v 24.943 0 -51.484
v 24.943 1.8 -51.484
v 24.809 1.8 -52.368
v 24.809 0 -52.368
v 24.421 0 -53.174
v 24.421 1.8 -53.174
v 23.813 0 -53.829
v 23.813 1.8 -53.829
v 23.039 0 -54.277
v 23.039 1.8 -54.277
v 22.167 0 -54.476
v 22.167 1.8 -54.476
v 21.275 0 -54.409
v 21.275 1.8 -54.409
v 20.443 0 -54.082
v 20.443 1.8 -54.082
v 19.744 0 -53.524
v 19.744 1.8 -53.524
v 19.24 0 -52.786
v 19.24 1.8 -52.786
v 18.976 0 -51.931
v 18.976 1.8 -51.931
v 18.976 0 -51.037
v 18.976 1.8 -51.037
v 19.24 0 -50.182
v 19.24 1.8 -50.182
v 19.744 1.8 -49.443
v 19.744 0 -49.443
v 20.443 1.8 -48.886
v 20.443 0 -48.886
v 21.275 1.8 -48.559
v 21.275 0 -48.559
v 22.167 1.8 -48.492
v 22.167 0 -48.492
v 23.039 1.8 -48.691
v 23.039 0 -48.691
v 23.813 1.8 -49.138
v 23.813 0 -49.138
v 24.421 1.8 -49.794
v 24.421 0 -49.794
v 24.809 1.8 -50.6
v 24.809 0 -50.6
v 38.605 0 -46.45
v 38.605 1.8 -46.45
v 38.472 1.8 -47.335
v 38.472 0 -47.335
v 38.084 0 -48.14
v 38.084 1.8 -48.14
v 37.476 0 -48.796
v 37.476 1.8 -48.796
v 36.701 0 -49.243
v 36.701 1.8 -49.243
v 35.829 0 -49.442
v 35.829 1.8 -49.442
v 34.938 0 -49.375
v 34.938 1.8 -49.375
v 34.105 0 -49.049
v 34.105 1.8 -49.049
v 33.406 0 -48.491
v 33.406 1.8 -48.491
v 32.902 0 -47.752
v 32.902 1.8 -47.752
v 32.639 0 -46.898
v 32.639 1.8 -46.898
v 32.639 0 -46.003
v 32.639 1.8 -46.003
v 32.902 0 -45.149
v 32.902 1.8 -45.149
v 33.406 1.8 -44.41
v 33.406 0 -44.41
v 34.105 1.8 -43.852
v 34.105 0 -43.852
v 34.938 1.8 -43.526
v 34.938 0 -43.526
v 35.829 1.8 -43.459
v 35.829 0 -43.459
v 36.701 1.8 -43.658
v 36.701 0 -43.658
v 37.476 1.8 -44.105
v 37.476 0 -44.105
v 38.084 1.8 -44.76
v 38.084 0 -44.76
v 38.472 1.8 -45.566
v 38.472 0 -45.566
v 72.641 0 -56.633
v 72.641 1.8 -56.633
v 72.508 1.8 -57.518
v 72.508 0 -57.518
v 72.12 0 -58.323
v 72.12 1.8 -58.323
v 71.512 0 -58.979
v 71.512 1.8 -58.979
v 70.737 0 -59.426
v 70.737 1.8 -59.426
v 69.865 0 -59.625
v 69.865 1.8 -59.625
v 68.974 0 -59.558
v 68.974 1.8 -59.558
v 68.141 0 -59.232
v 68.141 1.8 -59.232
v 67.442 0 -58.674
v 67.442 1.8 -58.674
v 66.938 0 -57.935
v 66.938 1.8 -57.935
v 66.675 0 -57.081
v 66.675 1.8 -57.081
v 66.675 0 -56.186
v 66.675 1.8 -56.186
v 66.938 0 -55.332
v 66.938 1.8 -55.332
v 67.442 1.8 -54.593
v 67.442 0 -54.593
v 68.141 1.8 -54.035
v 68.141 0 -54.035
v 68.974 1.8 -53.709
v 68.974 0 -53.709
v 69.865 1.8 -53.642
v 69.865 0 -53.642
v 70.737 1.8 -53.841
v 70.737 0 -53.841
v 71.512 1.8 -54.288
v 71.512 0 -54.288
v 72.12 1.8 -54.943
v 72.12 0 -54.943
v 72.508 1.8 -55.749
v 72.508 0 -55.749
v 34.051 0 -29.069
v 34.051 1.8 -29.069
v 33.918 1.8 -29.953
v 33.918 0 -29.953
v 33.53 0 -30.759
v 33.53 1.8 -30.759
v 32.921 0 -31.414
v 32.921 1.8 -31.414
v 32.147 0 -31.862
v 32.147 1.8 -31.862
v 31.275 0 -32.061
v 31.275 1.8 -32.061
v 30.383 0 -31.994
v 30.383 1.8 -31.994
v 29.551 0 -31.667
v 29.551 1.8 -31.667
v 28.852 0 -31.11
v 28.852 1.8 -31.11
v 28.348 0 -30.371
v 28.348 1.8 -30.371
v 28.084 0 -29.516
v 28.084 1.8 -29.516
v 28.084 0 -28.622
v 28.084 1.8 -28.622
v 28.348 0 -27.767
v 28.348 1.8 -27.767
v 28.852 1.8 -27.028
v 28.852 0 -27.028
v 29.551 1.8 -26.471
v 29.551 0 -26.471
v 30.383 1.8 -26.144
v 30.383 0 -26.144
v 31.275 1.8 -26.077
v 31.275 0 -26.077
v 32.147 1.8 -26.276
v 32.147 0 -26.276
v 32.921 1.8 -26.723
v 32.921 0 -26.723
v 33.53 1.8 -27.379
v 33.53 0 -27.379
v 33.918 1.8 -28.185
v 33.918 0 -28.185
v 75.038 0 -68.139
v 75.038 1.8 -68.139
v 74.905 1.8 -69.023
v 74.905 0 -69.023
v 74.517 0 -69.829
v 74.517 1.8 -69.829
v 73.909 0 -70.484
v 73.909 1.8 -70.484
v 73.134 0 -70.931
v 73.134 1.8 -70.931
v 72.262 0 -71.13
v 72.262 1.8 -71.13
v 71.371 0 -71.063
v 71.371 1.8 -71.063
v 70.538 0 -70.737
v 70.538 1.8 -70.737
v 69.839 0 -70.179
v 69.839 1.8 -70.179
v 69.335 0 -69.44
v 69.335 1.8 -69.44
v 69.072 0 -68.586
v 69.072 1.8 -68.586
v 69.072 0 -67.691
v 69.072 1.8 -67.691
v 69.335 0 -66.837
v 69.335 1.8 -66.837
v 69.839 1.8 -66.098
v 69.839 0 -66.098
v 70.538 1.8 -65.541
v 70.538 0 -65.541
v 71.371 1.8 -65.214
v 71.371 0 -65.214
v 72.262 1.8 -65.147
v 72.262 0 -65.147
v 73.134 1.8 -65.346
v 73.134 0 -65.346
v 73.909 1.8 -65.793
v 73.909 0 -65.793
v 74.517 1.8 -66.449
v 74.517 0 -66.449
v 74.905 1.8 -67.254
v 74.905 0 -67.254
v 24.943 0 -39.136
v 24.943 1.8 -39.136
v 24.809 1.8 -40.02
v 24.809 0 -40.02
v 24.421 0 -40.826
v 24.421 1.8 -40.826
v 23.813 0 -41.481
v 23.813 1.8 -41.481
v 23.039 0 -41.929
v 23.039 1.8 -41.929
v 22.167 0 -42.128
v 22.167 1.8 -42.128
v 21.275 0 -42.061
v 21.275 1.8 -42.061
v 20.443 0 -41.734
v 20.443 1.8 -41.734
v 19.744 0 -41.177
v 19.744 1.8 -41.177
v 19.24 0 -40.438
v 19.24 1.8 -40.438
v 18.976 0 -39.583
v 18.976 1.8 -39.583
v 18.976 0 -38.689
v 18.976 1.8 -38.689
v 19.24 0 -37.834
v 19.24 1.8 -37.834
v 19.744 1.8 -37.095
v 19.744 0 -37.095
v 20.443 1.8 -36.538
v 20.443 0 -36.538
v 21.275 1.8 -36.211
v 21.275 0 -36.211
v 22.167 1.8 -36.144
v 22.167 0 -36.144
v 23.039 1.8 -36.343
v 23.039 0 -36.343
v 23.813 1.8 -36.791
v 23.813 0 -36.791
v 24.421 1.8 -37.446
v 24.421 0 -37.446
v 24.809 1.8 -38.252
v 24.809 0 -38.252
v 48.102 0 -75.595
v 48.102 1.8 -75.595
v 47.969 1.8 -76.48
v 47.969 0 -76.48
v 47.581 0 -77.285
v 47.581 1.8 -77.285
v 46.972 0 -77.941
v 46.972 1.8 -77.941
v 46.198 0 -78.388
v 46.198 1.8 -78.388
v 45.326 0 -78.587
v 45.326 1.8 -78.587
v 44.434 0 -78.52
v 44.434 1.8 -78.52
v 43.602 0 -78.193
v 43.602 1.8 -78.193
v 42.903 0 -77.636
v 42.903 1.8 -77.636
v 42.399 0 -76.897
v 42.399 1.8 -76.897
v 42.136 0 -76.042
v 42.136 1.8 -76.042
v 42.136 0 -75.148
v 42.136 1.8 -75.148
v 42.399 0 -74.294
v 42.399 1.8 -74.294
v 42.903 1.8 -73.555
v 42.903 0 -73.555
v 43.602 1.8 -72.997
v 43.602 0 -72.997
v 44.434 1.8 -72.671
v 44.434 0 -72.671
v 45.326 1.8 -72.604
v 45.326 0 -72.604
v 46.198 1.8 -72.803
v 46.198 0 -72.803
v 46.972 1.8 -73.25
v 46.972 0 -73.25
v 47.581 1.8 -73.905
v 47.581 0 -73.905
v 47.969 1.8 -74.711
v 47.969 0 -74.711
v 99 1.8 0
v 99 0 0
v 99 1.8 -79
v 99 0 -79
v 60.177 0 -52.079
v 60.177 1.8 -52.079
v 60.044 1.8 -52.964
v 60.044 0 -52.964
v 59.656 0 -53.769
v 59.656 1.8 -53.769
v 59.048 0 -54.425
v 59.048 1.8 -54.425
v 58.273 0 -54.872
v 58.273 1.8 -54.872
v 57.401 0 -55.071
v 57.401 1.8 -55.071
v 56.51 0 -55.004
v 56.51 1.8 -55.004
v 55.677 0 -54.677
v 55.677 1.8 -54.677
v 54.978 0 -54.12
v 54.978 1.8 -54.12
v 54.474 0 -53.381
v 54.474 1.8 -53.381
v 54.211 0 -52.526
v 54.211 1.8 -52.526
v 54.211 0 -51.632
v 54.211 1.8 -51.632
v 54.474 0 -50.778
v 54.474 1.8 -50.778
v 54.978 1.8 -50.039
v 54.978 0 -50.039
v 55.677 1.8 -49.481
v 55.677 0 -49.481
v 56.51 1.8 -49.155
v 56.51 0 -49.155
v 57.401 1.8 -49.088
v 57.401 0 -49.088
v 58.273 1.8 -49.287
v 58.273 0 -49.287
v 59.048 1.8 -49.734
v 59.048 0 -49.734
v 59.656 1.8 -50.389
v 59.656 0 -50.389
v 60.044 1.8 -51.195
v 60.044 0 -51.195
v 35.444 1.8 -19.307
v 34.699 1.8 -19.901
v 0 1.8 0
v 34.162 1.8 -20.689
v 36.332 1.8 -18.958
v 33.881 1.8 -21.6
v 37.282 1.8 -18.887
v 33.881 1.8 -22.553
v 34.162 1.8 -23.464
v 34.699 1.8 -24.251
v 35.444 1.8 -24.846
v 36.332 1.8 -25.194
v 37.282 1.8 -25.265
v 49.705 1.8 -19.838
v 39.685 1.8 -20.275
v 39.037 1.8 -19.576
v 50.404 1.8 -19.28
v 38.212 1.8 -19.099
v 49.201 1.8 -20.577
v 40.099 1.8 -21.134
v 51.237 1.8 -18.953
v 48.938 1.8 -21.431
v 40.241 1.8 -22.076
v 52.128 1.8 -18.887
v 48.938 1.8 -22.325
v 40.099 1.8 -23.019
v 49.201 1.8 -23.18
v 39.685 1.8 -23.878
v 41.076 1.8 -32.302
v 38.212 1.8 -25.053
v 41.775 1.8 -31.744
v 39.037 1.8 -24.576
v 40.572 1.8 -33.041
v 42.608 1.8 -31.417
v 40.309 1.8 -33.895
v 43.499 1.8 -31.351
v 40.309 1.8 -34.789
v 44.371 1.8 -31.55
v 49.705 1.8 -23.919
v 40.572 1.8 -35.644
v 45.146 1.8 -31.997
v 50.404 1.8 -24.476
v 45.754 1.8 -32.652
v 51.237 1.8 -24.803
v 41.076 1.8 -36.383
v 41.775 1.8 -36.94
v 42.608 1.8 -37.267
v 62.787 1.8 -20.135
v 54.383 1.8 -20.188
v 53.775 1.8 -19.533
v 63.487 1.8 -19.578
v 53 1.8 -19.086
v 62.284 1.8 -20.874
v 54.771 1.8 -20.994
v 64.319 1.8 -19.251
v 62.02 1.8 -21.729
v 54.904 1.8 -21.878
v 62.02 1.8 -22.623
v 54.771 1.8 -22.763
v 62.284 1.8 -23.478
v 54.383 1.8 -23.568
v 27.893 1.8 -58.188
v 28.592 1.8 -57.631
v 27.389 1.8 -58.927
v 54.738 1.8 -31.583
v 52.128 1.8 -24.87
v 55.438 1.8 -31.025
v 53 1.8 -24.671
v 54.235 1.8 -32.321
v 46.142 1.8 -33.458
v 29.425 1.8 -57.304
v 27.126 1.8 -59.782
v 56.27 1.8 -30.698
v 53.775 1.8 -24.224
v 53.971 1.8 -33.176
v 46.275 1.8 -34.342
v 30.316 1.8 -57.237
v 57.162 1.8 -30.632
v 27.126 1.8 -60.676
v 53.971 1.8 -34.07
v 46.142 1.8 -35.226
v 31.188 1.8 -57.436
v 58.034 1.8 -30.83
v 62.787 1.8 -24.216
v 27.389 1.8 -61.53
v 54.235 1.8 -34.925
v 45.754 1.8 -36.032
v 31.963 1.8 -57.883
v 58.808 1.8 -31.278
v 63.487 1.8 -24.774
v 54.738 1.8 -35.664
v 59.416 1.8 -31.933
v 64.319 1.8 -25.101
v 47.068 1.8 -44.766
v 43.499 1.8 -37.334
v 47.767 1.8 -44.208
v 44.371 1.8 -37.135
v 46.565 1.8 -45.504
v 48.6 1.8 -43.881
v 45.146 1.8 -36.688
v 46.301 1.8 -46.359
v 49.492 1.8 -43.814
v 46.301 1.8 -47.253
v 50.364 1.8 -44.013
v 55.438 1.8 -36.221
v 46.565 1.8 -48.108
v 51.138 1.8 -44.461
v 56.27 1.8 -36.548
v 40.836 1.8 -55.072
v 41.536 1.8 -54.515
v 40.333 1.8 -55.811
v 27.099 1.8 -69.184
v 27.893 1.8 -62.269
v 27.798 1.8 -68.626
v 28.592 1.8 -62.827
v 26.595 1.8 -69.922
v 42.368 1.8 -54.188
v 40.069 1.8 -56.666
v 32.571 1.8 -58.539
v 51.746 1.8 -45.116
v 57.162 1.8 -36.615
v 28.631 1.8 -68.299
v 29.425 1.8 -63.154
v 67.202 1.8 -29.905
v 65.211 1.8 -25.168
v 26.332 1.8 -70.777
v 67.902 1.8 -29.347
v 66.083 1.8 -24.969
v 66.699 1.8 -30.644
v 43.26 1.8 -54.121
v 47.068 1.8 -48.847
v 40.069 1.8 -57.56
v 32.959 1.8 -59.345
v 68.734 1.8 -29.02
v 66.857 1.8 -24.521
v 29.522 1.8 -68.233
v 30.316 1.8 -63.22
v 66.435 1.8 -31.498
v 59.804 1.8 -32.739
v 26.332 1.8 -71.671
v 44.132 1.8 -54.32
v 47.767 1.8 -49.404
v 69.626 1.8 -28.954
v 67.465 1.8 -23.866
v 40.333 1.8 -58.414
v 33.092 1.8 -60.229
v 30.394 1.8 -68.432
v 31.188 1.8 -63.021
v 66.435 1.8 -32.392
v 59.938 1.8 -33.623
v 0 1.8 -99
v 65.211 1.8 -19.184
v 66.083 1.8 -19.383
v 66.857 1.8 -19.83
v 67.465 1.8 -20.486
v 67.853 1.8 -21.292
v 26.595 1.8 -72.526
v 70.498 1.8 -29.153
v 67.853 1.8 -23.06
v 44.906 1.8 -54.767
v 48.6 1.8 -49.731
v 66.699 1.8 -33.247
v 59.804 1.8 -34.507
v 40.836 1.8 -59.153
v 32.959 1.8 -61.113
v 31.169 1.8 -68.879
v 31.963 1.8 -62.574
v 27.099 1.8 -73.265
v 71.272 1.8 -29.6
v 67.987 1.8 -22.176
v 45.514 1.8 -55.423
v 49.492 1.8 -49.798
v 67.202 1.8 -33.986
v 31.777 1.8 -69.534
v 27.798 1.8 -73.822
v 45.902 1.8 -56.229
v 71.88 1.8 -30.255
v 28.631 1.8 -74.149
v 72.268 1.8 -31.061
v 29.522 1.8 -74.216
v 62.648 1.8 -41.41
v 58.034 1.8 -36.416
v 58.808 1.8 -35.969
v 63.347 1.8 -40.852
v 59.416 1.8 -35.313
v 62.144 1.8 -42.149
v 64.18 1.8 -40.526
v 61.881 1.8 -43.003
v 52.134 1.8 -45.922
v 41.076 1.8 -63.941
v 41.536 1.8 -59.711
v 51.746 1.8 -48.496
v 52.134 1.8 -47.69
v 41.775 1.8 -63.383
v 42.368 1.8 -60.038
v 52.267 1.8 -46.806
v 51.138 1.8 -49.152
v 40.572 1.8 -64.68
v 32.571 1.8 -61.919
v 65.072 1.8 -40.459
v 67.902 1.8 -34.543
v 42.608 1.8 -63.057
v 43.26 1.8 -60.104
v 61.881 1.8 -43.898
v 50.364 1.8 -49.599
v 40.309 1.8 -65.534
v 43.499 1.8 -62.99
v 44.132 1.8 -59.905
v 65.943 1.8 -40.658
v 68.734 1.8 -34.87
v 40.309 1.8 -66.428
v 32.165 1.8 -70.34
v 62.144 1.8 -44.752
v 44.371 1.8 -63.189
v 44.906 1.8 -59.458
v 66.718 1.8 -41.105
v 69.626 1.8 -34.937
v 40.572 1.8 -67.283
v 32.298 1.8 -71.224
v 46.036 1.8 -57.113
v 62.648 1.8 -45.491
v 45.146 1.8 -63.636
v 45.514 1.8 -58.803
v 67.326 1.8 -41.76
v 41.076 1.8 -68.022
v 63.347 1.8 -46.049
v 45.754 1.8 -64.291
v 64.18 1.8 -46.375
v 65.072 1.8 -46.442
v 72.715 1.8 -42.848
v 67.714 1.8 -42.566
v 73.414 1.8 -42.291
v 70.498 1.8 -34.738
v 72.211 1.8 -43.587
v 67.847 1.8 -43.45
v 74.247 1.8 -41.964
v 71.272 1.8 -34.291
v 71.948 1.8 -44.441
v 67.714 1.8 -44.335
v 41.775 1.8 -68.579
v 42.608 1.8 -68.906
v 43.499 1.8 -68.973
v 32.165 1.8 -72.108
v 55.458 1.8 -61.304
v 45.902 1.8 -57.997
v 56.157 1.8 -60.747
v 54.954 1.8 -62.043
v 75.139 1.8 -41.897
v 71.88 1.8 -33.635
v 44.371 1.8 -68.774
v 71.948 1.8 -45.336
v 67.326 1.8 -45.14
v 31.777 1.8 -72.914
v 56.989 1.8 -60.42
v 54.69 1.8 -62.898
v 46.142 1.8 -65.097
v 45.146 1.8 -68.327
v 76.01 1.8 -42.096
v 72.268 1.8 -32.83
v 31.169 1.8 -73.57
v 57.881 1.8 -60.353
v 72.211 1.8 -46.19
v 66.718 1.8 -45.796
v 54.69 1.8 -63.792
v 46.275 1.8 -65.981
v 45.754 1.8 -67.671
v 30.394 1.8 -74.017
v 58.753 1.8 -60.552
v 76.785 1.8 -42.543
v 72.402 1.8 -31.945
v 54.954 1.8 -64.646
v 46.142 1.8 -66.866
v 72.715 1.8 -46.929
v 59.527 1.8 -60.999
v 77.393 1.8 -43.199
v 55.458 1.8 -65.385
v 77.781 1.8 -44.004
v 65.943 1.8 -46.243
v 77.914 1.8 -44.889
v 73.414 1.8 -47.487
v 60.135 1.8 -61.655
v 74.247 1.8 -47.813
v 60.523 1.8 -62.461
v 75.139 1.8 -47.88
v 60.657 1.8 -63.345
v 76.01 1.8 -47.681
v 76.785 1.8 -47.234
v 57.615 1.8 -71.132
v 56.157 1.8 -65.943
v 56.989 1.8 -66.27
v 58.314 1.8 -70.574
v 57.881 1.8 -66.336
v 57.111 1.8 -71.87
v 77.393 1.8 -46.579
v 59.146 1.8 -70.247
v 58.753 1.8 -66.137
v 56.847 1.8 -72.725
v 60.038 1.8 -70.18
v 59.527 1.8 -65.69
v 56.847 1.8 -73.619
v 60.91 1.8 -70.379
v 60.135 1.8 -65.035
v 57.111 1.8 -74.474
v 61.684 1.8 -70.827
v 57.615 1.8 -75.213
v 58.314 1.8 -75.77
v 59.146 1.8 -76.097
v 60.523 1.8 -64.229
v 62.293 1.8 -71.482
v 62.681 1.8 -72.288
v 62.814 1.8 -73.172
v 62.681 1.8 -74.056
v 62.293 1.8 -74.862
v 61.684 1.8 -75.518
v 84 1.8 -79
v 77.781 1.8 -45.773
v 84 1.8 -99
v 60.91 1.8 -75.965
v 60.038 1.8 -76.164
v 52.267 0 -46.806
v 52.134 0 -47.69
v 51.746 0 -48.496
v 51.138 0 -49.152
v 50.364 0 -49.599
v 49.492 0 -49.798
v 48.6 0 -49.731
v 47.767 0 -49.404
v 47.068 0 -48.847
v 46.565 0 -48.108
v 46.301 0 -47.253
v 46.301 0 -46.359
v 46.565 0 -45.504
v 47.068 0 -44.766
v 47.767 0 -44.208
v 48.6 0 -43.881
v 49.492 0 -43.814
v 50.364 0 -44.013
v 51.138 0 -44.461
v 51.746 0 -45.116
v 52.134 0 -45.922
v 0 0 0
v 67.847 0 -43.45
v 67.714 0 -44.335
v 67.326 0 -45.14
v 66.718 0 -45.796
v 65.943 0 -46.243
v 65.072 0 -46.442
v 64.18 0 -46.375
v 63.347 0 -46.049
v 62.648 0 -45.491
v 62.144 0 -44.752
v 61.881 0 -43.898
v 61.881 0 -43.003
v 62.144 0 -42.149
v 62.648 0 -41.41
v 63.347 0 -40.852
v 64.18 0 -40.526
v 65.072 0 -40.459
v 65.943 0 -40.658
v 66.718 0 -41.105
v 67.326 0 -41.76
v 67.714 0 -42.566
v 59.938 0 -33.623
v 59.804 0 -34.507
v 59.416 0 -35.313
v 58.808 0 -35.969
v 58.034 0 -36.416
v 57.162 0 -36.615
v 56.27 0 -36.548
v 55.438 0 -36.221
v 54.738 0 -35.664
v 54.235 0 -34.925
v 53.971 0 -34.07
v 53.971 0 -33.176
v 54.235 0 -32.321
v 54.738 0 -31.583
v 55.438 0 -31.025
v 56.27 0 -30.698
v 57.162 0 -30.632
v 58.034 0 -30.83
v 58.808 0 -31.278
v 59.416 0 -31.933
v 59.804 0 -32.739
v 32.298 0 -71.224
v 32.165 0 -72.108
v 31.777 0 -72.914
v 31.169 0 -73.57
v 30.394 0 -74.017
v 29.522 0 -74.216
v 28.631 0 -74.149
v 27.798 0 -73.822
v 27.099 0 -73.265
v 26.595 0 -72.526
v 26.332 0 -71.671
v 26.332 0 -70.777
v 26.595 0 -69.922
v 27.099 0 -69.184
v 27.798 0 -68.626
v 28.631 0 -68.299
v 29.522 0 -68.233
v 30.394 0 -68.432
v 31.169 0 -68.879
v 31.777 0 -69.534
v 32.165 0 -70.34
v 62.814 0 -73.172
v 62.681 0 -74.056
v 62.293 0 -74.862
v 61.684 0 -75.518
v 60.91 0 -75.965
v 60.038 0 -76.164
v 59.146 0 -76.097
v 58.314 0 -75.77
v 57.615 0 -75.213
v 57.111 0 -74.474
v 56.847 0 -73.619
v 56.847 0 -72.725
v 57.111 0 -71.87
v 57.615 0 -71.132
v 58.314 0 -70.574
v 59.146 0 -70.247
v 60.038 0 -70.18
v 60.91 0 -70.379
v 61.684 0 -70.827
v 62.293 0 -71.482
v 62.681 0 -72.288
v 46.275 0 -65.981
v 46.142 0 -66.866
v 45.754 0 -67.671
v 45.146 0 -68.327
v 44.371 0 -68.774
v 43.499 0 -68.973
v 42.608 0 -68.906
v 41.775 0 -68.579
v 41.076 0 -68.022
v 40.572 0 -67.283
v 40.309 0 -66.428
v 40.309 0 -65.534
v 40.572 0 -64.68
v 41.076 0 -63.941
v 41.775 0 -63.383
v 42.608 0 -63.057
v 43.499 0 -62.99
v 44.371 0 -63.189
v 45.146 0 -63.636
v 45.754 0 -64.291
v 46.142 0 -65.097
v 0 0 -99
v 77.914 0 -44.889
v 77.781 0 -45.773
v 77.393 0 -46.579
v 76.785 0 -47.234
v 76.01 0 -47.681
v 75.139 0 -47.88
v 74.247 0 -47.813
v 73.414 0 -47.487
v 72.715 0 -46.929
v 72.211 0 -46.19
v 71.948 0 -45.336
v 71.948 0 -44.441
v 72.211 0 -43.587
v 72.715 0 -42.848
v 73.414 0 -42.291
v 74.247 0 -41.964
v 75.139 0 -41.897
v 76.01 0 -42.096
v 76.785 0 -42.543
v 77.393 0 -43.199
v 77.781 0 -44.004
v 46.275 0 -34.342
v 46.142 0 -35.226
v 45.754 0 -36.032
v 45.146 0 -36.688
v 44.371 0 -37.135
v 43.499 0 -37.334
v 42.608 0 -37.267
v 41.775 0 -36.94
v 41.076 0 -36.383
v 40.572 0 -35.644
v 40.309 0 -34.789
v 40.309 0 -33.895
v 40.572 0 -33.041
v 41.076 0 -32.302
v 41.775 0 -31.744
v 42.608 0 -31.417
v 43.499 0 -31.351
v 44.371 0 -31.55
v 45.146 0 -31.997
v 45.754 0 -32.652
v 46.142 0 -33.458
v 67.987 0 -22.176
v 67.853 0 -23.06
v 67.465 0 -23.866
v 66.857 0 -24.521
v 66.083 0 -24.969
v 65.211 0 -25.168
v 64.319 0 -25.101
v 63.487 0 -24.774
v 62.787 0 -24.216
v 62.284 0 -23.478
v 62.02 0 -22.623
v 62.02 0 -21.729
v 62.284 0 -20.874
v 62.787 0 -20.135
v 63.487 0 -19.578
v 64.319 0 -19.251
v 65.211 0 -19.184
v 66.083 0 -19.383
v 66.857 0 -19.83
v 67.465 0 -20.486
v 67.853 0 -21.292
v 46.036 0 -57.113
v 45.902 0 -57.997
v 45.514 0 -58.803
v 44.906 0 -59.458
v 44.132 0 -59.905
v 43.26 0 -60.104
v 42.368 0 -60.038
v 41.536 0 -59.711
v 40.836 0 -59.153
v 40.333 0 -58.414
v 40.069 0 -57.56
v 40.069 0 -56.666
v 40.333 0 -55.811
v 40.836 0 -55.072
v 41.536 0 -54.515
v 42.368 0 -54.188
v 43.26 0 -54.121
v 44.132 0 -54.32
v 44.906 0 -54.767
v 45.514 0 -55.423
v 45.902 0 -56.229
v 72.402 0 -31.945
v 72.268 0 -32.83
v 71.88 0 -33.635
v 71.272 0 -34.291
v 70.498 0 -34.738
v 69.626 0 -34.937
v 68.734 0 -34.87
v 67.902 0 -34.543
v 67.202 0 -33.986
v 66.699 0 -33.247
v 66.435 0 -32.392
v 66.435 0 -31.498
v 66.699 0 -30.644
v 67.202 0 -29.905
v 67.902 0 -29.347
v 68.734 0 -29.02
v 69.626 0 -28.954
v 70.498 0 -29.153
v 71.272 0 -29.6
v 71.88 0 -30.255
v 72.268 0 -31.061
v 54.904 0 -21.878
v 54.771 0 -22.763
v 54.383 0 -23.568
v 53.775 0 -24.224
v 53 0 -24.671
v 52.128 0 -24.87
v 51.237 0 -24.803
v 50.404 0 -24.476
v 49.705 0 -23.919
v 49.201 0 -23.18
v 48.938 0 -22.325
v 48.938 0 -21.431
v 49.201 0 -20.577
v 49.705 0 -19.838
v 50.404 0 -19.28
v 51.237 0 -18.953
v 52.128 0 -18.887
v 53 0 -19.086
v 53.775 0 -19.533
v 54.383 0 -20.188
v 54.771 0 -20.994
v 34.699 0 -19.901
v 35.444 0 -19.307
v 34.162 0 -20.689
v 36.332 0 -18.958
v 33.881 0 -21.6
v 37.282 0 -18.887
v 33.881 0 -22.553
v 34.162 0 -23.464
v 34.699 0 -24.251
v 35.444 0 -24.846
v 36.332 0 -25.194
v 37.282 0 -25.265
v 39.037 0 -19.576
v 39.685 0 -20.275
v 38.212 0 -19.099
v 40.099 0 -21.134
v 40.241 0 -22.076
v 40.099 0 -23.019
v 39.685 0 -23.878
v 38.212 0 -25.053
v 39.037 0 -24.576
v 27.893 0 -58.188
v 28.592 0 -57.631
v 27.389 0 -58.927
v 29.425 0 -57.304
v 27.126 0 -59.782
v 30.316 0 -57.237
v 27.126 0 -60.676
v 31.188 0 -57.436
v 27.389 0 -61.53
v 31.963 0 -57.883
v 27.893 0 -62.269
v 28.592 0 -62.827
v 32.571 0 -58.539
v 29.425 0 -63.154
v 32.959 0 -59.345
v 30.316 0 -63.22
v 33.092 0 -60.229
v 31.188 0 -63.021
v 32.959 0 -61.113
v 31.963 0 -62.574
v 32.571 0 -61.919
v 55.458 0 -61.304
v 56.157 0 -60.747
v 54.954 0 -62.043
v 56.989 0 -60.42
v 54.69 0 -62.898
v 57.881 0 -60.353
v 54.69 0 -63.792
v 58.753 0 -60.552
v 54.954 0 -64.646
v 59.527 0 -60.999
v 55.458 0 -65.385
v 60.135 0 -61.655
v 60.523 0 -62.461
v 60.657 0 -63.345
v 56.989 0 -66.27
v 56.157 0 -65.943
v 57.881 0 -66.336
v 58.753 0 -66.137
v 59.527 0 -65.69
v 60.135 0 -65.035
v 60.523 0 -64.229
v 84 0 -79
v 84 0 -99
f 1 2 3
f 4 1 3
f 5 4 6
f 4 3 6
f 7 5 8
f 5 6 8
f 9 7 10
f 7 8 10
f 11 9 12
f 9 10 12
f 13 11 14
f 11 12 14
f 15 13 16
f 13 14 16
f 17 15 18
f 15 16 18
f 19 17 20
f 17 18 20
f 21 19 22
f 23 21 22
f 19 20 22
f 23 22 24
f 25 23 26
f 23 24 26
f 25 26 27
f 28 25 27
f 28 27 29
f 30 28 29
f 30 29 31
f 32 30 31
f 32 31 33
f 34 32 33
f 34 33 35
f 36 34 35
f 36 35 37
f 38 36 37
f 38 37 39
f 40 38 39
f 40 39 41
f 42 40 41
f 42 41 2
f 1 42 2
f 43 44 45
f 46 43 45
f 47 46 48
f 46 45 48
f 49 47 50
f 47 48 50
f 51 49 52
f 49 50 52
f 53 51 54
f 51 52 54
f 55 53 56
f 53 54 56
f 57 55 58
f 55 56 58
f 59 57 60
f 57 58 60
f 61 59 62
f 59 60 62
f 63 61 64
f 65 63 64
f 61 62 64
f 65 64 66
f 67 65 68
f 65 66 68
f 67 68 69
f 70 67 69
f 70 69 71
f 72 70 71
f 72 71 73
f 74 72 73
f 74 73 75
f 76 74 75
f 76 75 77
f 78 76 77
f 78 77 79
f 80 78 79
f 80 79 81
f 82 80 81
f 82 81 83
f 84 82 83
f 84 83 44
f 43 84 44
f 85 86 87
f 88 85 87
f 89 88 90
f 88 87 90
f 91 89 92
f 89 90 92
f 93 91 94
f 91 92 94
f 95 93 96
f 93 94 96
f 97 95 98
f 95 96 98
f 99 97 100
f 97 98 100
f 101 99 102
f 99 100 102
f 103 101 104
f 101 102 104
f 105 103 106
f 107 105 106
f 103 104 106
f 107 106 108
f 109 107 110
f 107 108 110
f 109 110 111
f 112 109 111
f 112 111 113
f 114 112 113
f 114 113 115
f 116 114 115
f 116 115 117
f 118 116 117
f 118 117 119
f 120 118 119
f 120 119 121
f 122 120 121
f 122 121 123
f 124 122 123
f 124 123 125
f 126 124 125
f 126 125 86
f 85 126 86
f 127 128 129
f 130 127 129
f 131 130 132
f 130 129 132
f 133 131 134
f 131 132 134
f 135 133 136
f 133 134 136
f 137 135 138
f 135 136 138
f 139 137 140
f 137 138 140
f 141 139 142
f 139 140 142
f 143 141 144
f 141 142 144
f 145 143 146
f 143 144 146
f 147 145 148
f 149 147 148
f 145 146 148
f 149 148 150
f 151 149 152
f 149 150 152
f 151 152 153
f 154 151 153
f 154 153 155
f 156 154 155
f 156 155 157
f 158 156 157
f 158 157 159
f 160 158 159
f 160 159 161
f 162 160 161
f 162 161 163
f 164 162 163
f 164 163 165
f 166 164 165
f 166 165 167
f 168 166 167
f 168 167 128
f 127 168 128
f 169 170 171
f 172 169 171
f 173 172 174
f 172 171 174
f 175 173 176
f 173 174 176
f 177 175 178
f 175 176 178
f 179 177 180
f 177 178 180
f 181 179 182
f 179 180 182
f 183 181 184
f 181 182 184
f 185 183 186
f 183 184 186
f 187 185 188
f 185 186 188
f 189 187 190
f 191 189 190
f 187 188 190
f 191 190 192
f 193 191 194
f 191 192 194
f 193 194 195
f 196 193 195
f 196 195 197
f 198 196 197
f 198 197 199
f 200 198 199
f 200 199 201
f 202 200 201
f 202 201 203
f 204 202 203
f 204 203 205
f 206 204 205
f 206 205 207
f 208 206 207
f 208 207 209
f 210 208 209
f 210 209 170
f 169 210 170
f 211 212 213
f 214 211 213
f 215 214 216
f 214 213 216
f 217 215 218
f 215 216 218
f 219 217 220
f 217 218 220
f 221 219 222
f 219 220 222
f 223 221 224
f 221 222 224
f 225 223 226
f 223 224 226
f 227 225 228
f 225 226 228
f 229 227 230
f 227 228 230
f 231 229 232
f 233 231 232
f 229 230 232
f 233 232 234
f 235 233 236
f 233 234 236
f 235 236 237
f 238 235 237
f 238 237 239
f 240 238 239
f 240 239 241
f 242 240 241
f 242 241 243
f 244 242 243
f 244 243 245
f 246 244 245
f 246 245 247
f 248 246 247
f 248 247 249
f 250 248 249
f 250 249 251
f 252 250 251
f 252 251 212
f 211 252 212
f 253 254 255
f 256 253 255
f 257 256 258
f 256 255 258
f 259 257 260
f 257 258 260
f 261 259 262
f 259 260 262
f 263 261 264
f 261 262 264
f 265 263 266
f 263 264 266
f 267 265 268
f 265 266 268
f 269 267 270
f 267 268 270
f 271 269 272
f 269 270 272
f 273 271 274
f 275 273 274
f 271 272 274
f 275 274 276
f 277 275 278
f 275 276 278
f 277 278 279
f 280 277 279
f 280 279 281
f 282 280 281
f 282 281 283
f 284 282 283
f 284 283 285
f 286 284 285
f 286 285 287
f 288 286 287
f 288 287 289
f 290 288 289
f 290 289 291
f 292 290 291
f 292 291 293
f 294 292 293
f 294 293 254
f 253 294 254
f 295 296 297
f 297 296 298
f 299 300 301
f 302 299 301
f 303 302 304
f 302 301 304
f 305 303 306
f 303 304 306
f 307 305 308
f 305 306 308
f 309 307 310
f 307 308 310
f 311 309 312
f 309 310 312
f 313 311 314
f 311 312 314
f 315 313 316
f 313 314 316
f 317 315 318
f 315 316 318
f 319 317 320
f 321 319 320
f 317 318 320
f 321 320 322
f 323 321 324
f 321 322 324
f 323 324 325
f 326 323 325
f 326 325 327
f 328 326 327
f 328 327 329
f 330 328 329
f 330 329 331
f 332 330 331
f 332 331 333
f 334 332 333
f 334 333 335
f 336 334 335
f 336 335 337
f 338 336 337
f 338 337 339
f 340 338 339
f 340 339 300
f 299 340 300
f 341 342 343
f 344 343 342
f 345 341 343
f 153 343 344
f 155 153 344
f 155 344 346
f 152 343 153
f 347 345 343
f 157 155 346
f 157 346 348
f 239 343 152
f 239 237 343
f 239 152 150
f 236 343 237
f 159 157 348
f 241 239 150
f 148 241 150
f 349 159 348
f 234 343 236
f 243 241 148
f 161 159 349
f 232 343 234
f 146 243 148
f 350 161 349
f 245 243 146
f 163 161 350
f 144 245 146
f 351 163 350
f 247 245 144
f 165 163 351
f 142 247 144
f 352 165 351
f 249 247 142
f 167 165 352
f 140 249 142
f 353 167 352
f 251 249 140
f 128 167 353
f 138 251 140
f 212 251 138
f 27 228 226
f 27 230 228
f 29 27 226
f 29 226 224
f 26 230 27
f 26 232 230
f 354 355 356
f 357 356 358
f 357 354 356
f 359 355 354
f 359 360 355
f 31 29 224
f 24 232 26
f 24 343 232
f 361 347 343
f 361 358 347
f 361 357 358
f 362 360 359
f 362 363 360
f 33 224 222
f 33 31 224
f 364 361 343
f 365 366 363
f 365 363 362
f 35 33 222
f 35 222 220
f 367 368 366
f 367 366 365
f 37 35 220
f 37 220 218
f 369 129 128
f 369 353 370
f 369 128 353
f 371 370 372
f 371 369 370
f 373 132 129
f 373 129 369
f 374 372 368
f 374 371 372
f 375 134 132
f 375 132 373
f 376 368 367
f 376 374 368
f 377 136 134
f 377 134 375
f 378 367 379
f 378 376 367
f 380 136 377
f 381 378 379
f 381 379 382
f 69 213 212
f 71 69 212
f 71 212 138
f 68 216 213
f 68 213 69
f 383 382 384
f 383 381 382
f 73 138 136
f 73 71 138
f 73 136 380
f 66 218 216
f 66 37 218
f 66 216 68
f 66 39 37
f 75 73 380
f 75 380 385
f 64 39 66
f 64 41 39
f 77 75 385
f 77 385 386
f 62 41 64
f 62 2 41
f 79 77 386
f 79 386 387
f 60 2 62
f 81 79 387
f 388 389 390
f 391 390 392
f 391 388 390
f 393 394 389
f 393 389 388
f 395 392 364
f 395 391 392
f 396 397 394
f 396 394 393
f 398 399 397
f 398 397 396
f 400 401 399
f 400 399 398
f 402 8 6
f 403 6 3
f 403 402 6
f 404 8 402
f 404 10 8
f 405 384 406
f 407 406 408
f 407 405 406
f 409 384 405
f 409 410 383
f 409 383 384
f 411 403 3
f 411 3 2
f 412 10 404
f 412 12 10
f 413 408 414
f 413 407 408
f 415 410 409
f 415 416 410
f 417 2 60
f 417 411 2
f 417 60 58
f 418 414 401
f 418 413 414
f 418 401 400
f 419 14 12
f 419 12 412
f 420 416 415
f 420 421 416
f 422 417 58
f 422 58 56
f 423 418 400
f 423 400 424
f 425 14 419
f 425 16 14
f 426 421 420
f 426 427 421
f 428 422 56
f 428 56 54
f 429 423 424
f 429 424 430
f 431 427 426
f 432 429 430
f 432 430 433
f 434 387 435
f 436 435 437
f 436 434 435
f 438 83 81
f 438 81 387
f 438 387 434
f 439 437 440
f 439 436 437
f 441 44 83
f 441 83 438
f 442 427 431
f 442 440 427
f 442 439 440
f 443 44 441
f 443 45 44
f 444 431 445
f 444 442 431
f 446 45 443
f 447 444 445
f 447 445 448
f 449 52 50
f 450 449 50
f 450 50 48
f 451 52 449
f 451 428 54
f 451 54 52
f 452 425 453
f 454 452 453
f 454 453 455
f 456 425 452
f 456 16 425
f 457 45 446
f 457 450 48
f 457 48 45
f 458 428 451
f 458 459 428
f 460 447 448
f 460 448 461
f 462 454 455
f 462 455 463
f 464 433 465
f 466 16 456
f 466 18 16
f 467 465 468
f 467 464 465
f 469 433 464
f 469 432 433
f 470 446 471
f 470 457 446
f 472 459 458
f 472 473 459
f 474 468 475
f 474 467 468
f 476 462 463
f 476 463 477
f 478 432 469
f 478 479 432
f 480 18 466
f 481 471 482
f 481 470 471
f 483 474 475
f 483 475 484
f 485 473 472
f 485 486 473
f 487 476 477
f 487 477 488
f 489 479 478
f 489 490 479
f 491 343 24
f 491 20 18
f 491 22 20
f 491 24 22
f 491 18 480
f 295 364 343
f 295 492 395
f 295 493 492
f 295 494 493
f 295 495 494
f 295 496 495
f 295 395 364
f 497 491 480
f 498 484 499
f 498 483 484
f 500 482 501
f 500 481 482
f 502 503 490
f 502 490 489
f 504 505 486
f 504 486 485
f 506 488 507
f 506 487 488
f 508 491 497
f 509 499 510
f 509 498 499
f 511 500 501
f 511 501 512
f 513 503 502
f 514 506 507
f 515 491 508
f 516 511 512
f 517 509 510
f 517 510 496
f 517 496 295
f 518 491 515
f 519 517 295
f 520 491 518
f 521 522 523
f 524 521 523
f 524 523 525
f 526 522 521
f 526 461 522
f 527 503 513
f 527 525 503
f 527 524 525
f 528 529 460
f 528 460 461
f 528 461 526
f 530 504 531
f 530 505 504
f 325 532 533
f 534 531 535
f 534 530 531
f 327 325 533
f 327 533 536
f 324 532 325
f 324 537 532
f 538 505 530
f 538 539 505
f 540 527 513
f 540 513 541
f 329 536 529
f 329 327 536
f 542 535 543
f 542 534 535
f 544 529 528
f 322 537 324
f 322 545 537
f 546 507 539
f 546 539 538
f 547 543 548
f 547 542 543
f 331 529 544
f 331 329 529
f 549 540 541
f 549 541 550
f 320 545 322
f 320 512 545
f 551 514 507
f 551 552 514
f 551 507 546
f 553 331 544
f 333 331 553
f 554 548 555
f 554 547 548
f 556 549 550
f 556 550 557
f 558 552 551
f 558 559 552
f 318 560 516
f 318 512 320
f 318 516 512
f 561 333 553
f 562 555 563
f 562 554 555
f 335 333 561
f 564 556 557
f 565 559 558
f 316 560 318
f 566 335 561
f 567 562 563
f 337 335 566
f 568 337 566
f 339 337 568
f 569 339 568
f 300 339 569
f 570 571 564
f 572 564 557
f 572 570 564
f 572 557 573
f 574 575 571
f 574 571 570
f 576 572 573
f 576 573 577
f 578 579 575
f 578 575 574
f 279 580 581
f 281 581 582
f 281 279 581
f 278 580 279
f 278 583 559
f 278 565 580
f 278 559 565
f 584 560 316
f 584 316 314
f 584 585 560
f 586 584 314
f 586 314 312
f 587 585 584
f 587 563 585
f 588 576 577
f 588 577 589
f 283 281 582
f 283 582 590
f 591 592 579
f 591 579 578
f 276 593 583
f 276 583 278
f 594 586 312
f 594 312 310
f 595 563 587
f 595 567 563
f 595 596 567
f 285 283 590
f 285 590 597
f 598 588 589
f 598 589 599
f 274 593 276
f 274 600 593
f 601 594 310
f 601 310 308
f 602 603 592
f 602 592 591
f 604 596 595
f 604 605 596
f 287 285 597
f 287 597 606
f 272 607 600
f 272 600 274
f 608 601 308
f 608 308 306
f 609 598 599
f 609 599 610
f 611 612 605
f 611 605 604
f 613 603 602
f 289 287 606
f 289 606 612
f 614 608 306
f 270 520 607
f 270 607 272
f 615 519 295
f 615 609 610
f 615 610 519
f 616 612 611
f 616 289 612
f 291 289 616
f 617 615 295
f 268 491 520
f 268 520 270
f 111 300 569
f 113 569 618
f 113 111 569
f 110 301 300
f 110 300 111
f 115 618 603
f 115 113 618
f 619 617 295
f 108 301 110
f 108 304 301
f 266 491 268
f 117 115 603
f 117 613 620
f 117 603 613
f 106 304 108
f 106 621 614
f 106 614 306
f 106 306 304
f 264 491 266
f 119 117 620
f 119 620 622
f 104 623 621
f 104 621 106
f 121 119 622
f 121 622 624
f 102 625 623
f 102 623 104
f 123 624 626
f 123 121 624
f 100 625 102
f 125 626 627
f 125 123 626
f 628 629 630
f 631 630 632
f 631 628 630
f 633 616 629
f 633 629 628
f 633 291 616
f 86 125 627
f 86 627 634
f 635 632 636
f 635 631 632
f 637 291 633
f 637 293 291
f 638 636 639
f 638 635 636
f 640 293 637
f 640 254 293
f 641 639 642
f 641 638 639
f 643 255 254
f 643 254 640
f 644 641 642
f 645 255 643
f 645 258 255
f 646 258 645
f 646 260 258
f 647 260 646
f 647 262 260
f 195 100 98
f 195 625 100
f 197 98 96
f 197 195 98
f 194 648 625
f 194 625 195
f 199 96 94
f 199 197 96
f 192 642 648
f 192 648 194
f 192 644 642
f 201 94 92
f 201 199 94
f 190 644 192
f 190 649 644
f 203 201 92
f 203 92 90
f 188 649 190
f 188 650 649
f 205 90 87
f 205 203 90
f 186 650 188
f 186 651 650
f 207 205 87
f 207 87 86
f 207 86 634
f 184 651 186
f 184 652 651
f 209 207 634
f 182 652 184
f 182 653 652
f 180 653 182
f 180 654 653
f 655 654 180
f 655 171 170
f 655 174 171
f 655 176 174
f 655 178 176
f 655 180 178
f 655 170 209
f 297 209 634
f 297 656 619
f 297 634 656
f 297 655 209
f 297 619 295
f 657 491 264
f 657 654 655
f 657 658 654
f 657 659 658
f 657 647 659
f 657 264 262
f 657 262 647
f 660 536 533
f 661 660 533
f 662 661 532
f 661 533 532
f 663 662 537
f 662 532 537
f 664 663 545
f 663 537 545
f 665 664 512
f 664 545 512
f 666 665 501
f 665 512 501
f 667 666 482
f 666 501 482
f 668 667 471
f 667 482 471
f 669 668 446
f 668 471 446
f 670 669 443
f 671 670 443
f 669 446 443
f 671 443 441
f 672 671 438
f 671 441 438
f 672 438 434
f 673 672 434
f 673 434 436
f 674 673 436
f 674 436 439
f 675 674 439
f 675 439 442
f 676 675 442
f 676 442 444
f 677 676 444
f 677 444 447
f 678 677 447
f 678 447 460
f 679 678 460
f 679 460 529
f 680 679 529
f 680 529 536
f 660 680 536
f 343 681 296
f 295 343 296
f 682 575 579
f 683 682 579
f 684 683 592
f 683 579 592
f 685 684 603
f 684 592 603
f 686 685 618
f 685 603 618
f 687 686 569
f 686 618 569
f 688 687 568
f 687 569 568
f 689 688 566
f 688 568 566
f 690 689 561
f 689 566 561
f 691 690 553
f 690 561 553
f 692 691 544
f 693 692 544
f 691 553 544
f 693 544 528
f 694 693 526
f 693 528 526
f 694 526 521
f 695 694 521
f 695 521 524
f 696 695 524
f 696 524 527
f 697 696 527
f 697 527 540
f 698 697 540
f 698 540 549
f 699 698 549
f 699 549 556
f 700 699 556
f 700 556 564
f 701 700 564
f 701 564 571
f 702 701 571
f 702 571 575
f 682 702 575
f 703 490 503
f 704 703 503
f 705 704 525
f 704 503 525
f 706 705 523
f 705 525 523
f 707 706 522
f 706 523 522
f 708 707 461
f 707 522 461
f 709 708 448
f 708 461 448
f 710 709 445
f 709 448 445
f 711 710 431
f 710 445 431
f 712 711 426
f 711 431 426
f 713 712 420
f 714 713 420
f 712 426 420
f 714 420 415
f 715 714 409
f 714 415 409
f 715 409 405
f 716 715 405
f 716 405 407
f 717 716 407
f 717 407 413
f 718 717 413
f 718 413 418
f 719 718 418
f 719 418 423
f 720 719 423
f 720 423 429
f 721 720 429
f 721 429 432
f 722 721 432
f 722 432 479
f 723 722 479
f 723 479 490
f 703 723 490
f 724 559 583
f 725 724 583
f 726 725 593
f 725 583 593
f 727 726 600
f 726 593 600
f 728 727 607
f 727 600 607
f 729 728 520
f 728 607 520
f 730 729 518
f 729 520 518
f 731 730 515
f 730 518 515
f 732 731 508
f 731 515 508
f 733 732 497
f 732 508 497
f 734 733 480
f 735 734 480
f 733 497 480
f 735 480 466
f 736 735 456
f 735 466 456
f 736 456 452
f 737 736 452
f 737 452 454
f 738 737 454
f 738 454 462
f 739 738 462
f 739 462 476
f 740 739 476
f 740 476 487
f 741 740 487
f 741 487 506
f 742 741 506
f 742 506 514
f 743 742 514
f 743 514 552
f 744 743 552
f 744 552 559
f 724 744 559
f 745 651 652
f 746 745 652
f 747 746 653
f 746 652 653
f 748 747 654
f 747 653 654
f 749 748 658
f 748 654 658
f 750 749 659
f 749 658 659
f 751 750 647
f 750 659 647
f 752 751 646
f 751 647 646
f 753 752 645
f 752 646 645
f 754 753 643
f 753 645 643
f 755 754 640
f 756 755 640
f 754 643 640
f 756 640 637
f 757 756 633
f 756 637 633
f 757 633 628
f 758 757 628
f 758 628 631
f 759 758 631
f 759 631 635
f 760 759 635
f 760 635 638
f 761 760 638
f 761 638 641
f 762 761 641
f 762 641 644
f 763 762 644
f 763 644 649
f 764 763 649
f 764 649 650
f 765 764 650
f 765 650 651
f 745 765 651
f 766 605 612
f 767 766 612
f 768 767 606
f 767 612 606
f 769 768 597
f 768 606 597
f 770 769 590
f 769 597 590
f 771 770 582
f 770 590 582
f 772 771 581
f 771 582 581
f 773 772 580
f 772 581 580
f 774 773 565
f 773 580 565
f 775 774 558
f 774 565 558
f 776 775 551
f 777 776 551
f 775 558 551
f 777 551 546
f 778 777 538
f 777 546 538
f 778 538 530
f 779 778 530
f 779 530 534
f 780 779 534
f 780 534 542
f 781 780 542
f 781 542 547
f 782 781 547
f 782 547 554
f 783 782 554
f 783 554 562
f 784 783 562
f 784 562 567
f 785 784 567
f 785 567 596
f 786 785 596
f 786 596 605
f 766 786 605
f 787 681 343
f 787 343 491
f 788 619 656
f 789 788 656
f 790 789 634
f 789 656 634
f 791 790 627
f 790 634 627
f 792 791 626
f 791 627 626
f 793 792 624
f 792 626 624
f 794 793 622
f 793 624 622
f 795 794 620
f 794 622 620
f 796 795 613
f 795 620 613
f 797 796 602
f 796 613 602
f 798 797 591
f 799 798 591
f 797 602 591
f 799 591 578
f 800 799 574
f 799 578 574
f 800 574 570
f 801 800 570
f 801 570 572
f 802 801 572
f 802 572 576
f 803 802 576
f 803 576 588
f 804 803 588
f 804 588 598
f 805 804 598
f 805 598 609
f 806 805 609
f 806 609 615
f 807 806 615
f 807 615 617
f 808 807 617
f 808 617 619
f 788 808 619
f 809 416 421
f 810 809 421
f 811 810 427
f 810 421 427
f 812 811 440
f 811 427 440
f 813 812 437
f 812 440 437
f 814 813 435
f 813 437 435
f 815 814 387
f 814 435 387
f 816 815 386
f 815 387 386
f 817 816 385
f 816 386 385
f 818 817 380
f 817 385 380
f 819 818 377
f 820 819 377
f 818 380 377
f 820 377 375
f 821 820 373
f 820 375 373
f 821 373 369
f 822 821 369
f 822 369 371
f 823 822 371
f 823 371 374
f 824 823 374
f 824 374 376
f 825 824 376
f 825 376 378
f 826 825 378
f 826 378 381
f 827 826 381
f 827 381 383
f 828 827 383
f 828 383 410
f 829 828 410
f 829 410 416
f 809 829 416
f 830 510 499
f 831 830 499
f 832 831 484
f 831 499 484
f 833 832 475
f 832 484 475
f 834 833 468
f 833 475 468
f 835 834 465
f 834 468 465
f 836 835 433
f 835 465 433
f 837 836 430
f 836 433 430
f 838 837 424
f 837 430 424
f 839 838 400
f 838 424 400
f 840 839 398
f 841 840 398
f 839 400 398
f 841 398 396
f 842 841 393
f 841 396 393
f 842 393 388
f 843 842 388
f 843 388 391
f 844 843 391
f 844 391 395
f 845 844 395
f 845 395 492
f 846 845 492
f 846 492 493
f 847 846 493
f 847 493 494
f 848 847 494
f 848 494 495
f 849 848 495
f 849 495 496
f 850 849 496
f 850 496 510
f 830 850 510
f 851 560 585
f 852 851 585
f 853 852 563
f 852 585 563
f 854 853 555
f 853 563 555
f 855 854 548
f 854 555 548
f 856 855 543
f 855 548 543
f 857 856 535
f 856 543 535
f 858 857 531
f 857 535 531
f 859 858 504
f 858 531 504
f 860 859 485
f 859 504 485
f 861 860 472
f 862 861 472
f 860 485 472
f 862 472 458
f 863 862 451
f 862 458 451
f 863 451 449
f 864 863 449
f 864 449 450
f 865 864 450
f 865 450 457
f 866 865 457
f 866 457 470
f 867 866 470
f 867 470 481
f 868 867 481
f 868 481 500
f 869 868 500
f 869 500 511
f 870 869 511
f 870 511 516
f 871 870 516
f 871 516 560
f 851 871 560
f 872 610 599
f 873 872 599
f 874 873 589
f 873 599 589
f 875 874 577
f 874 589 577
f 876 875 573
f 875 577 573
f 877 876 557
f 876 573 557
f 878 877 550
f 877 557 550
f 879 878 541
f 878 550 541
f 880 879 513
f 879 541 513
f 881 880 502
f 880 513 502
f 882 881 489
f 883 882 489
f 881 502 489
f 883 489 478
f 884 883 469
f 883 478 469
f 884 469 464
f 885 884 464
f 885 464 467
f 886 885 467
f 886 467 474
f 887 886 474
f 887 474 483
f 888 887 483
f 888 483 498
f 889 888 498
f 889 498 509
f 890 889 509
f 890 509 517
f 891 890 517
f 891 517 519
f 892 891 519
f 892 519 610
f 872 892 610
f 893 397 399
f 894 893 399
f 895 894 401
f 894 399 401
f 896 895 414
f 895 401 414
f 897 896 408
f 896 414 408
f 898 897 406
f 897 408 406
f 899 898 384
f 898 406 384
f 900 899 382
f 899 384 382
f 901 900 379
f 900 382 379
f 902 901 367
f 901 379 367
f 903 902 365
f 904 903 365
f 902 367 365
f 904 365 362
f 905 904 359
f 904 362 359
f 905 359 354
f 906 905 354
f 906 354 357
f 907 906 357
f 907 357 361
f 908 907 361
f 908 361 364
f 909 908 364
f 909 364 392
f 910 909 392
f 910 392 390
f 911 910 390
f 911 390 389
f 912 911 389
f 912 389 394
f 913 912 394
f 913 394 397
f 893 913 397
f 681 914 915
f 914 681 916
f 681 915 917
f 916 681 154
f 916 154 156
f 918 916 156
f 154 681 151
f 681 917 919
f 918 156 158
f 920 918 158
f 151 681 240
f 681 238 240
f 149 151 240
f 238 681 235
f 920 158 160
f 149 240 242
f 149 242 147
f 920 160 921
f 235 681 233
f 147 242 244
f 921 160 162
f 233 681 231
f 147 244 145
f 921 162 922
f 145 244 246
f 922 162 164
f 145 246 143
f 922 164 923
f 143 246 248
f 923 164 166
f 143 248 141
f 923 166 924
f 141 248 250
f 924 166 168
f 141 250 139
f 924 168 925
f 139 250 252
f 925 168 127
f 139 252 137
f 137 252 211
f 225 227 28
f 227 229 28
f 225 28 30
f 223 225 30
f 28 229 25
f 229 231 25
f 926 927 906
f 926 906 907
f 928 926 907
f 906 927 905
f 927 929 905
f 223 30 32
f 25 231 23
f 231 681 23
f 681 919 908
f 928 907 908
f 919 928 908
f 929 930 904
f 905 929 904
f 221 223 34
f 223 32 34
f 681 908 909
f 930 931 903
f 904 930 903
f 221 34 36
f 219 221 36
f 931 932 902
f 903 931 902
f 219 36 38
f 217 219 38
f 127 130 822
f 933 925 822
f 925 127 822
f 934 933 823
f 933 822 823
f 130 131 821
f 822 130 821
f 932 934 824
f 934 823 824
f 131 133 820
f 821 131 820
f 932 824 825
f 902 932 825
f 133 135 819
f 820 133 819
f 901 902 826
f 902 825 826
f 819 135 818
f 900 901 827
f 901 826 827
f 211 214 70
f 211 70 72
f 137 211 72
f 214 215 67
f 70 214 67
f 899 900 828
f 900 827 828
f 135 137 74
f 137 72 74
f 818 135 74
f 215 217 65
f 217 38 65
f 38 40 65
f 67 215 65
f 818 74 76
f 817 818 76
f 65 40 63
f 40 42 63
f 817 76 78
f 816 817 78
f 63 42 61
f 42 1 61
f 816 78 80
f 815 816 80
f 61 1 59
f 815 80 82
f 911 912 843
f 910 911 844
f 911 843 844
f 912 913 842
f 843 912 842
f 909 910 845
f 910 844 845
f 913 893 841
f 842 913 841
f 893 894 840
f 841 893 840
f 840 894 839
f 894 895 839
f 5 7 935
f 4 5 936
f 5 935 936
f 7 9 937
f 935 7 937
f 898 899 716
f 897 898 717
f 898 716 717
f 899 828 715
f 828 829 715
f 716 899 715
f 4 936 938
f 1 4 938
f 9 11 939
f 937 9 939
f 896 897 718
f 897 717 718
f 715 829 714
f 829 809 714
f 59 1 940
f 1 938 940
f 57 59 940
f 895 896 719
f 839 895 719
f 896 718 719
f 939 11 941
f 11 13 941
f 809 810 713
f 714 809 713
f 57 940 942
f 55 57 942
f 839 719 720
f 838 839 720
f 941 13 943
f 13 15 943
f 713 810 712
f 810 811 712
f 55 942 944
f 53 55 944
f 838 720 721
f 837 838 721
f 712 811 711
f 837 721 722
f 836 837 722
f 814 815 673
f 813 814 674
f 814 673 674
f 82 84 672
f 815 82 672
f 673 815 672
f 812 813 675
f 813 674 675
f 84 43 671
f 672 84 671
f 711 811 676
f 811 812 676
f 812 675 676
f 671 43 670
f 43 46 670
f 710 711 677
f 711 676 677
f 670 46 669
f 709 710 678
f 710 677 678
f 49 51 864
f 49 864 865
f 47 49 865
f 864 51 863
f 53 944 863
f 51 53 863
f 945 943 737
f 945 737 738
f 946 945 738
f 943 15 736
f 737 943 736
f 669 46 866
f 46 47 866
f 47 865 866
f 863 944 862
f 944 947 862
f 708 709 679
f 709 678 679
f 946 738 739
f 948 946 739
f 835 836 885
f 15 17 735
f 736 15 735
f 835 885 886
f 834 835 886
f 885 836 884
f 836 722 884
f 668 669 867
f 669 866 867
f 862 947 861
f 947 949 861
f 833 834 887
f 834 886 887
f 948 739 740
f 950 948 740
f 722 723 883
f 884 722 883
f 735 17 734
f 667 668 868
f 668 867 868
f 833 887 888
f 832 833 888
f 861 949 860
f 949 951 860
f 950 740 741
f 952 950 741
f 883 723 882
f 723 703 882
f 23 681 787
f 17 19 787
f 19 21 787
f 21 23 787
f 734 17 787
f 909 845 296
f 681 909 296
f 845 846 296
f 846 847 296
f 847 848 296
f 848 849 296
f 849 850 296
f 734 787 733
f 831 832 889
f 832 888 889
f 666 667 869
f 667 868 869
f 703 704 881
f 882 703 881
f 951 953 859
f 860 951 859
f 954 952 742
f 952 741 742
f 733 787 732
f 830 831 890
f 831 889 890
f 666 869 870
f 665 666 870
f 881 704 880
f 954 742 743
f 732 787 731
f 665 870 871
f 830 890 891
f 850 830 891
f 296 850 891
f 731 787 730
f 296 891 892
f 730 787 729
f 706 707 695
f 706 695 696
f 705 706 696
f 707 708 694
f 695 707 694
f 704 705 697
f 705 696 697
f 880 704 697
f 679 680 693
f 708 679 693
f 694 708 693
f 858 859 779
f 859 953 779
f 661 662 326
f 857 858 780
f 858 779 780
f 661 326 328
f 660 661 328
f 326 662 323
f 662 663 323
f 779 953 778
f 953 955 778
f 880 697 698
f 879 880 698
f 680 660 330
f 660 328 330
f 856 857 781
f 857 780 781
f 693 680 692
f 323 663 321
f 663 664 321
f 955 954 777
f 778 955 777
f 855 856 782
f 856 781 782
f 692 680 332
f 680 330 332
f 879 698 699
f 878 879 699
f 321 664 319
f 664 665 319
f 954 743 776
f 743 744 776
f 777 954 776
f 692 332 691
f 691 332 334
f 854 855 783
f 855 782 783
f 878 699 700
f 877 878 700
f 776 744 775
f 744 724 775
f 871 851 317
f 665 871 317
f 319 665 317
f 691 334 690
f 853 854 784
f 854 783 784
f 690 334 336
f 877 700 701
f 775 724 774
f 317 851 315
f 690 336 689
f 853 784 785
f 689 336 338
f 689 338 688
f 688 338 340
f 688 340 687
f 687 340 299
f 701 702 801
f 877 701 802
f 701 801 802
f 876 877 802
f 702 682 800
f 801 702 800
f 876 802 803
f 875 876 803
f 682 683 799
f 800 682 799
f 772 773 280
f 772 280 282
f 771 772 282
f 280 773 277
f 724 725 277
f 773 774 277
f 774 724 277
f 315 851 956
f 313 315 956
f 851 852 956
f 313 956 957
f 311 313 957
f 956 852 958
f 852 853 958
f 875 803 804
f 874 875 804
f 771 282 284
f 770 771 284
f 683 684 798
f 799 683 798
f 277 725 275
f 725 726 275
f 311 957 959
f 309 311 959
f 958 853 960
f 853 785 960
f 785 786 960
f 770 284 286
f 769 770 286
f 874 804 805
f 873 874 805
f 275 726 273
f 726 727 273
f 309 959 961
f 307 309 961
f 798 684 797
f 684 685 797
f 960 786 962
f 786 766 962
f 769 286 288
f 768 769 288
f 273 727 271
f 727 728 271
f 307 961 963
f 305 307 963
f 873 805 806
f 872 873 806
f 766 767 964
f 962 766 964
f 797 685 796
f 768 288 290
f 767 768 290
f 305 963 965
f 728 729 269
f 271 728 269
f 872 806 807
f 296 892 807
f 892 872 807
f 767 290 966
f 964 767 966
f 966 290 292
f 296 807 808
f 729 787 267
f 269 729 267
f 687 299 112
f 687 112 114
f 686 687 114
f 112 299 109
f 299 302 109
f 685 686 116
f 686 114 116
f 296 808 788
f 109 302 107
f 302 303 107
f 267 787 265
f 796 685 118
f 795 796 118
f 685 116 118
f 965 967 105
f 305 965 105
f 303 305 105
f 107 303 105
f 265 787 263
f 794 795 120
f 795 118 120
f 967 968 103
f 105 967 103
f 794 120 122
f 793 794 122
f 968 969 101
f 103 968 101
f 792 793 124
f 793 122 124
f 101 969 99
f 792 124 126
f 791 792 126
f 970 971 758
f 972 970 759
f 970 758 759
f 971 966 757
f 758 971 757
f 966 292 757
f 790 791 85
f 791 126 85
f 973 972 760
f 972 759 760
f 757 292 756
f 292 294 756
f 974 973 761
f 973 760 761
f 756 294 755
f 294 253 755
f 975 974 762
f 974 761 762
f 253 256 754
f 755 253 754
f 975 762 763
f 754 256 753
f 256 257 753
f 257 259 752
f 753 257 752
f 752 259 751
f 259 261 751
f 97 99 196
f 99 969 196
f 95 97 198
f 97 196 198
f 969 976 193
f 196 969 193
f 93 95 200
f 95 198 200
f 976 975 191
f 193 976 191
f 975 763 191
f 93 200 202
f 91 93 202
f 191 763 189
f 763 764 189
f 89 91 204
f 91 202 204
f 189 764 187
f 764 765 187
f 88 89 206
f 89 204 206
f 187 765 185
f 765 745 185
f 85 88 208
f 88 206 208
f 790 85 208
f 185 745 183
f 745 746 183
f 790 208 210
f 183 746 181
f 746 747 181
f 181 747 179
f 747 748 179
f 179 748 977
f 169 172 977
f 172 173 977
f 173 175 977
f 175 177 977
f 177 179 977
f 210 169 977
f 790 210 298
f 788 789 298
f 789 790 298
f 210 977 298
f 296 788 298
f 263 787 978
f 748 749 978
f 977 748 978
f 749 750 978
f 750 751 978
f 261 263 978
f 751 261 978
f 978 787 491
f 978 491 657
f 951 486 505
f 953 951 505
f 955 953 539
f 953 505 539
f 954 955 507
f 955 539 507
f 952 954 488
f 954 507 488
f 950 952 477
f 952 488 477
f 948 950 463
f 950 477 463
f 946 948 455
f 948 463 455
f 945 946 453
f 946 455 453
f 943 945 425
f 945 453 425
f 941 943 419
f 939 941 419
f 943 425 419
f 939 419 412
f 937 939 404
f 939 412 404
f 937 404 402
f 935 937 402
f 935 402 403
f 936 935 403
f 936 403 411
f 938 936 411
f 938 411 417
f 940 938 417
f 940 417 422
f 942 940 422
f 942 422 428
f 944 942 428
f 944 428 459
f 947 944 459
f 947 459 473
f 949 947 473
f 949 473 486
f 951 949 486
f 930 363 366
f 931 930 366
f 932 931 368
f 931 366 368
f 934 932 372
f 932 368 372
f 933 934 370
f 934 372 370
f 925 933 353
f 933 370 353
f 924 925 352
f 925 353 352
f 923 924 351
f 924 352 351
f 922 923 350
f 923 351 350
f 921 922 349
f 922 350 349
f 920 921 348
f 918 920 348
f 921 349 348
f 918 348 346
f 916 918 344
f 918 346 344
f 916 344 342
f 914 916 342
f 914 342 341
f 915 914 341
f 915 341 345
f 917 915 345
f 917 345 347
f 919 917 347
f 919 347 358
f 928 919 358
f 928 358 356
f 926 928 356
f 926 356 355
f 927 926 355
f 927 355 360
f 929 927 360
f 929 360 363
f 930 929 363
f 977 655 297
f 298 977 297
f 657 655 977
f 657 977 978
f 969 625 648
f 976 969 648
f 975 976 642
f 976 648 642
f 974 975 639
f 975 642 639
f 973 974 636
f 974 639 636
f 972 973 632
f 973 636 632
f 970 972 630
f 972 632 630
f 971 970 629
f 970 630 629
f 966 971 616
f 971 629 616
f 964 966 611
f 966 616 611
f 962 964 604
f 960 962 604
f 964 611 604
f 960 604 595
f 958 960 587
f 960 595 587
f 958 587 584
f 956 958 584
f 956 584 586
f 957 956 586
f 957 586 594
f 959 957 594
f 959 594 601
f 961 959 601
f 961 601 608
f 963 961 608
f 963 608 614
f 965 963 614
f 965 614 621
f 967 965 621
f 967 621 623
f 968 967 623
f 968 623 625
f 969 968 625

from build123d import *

# Parameters (mm, degrees)
SKETCH_1_W          = 99
SKETCH_1_H          = 99
EXTRUDE_1_DEPTH     = 1.8
SKETCH_2_R          = 3
SKETCH_2_R_2        = 3.197874374
CUT_EXTRUDE_1_DEPTH = 2.8
SKETCH_3_W          = 15
SKETCH_3_H          = 20
CUT_EXTRUDE_2_DEPTH = 2.8


with BuildPart() as part:
    # 草图1 → 凸台-拉伸1 (new body)
    with BuildSketch(Plane(origin=(0, 0, 0), x_dir=(1, 0, 0), z_dir=(0, 1, 0))):
        with Locations((49.5, 49.5)):
            Rectangle(SKETCH_1_W, SKETCH_1_H)
    extrude(amount=EXTRUDE_1_DEPTH)

    # 草图2 → 切除-拉伸1 (cut, through all)
    with BuildSketch(Plane(origin=(0, 1.8, 0), x_dir=(1, 0, 0), z_dir=(0, 1, 0))):
        with Locations((29.29818934, 71.224140528)):
            Circle(SKETCH_2_R)
        with Locations((45.102003727, 75.595349176)):
            Circle(SKETCH_2_R)
        with Locations((30.092218758, 60.228792633)):
            Circle(SKETCH_2_R)
        with Locations((35.605107574, 46.450435365)):
            Circle(SKETCH_2_R)
        with Locations((43.275213753, 34.342184277)):
            Circle(SKETCH_2_R)
        with Locations((56.937590385, 33.623111823)):
            Circle(SKETCH_2_R)
        with Locations((49.267484206, 46.806106819)):
            Circle(SKETCH_2_R)
        with Locations((64.847387383, 43.450435365)):
            Circle(SKETCH_2_R)
        with Locations((69.641203745, 56.633430361)):
            Circle(SKETCH_2_R)
        with Locations((57.65666284, 63.344773268)):
            Circle(SKETCH_2_R)
        with Locations((43.035522935, 57.112811997)):
            Circle(SKETCH_2_R)
        with Locations((43.275213753, 65.981372267)):
            Circle(SKETCH_2_R)
        with Locations((59.813880203, 73.172096811)):
            Circle(SKETCH_2_R)
        with Locations((69.401512927, 31.945276096)):
            Circle(SKETCH_2_R)
        with Locations((31.05098203, 29.068986279)):
            Circle(SKETCH_2_R)
        with Locations((51.904083205, 21.878261736)):
            Circle(SKETCH_2_R)
        with Locations((21.942730942, 39.13600064)):
            Circle(SKETCH_2_R)
        with Locations((21.942730942, 51.483942546)):
            Circle(SKETCH_2_R)
        with Locations((74.914401743, 44.888580274)):
            Circle(SKETCH_2_R)
        with Locations((64.98656548, 22.175939833)):
            Circle(SKETCH_2_R)
        with Locations((37.043252483, 22.07613611)):
            Circle(SKETCH_2_R_2)
        with Locations((72.038111926, 68.13858963)):
            Circle(SKETCH_2_R)
        with Locations((57.177281203, 52.079304817)):
            Circle(SKETCH_2_R)
    extrude(amount=-CUT_EXTRUDE_1_DEPTH, mode=Mode.SUBTRACT)

    # 草图3 → 切除-拉伸2 (cut, through all)
    with BuildSketch(Plane(origin=(0, 1.8, 0), x_dir=(1, 0, 0), z_dir=(0, 1, 0))):
        with Locations((91.5, 89)):
            Rectangle(SKETCH_3_W, SKETCH_3_H)
    extrude(amount=-CUT_EXTRUDE_2_DEPTH, mode=Mode.SUBTRACT)


solid = part.part
